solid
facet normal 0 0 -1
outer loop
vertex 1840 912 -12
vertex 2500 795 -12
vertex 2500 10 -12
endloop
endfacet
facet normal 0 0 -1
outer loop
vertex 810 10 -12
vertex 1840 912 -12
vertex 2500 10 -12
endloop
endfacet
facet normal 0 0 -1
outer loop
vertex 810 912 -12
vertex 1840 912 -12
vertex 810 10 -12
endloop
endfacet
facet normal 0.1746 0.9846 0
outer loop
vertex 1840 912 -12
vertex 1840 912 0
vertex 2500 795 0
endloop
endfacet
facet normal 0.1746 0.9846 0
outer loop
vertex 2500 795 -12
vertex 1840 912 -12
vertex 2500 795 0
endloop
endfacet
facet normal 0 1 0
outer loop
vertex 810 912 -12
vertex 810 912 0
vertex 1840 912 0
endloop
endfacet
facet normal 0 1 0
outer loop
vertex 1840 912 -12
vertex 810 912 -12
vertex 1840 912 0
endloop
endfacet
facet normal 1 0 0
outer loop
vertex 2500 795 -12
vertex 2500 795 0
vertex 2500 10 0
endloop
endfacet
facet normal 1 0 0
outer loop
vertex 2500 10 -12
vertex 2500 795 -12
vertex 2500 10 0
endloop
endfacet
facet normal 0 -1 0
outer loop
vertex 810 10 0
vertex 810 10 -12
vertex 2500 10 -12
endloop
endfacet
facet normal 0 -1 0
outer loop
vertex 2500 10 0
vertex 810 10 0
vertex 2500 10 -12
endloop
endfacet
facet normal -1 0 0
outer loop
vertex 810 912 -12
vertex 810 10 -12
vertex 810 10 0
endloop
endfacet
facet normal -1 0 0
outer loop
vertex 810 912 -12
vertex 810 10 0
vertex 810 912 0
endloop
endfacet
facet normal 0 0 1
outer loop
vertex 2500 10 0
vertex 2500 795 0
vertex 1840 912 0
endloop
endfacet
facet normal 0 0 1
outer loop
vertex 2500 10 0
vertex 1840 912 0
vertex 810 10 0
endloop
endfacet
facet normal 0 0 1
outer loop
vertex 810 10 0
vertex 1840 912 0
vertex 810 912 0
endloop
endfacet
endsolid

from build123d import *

# Parameters (mm, degrees)
TABAN_FLAN_1_DEPTH         = 12
KES_EKSTR_ZYON1_DEPTH      = 2662.181692407
KES_EKSTR_ZYON1_DEPTH_BACK = 2662.181692407
IZIM2_W                    = 2500
IZIM2_H                    = 10
KES_EKSTR_ZYON2_DEPTH      = 2662.181692407
KES_EKSTR_ZYON2_DEPTH_BACK = 2662.181692407


# Sheet-metal steps are written as plain solids
with BuildPart() as part:
    # Çizim1 → Taban-Flanş1 (new body)
    with BuildSketch(Plane.XY):
        Polygon((0, 0), (0, 795), (660, 912), (1840, 912), (2500, 795), (2500, 0), align=None)
    extrude(amount=-TABAN_FLAN_1_DEPTH)

    # Çizim2 → Kes-Ekstrüzyon1 (cut, two sides: drawn at the far end of the back side and taken through both)
    with BuildSketch(Plane.XY.offset(-KES_EKSTR_ZYON1_DEPTH_BACK)):
        with Locations((1250, 5)):
            Rectangle(IZIM2_W, IZIM2_H)
    extrude(amount=KES_EKSTR_ZYON1_DEPTH + KES_EKSTR_ZYON1_DEPTH_BACK, mode=Mode.SUBTRACT)

    # Çizim3 → Kes-Ekstrüzyon2 (cut, two sides: drawn at the far end of the back side and taken through both)
    with BuildSketch(Plane.XY.offset(-KES_EKSTR_ZYON2_DEPTH_BACK)):
        Polygon((810, 10), (810, 912), (-172.469977519, 1159.159604292), (-279.270596873, -118.492249454), (448.555846128, -150.136877411), align=None)
    extrude(amount=KES_EKSTR_ZYON2_DEPTH + KES_EKSTR_ZYON2_DEPTH_BACK, mode=Mode.SUBTRACT)


solid = part.part
